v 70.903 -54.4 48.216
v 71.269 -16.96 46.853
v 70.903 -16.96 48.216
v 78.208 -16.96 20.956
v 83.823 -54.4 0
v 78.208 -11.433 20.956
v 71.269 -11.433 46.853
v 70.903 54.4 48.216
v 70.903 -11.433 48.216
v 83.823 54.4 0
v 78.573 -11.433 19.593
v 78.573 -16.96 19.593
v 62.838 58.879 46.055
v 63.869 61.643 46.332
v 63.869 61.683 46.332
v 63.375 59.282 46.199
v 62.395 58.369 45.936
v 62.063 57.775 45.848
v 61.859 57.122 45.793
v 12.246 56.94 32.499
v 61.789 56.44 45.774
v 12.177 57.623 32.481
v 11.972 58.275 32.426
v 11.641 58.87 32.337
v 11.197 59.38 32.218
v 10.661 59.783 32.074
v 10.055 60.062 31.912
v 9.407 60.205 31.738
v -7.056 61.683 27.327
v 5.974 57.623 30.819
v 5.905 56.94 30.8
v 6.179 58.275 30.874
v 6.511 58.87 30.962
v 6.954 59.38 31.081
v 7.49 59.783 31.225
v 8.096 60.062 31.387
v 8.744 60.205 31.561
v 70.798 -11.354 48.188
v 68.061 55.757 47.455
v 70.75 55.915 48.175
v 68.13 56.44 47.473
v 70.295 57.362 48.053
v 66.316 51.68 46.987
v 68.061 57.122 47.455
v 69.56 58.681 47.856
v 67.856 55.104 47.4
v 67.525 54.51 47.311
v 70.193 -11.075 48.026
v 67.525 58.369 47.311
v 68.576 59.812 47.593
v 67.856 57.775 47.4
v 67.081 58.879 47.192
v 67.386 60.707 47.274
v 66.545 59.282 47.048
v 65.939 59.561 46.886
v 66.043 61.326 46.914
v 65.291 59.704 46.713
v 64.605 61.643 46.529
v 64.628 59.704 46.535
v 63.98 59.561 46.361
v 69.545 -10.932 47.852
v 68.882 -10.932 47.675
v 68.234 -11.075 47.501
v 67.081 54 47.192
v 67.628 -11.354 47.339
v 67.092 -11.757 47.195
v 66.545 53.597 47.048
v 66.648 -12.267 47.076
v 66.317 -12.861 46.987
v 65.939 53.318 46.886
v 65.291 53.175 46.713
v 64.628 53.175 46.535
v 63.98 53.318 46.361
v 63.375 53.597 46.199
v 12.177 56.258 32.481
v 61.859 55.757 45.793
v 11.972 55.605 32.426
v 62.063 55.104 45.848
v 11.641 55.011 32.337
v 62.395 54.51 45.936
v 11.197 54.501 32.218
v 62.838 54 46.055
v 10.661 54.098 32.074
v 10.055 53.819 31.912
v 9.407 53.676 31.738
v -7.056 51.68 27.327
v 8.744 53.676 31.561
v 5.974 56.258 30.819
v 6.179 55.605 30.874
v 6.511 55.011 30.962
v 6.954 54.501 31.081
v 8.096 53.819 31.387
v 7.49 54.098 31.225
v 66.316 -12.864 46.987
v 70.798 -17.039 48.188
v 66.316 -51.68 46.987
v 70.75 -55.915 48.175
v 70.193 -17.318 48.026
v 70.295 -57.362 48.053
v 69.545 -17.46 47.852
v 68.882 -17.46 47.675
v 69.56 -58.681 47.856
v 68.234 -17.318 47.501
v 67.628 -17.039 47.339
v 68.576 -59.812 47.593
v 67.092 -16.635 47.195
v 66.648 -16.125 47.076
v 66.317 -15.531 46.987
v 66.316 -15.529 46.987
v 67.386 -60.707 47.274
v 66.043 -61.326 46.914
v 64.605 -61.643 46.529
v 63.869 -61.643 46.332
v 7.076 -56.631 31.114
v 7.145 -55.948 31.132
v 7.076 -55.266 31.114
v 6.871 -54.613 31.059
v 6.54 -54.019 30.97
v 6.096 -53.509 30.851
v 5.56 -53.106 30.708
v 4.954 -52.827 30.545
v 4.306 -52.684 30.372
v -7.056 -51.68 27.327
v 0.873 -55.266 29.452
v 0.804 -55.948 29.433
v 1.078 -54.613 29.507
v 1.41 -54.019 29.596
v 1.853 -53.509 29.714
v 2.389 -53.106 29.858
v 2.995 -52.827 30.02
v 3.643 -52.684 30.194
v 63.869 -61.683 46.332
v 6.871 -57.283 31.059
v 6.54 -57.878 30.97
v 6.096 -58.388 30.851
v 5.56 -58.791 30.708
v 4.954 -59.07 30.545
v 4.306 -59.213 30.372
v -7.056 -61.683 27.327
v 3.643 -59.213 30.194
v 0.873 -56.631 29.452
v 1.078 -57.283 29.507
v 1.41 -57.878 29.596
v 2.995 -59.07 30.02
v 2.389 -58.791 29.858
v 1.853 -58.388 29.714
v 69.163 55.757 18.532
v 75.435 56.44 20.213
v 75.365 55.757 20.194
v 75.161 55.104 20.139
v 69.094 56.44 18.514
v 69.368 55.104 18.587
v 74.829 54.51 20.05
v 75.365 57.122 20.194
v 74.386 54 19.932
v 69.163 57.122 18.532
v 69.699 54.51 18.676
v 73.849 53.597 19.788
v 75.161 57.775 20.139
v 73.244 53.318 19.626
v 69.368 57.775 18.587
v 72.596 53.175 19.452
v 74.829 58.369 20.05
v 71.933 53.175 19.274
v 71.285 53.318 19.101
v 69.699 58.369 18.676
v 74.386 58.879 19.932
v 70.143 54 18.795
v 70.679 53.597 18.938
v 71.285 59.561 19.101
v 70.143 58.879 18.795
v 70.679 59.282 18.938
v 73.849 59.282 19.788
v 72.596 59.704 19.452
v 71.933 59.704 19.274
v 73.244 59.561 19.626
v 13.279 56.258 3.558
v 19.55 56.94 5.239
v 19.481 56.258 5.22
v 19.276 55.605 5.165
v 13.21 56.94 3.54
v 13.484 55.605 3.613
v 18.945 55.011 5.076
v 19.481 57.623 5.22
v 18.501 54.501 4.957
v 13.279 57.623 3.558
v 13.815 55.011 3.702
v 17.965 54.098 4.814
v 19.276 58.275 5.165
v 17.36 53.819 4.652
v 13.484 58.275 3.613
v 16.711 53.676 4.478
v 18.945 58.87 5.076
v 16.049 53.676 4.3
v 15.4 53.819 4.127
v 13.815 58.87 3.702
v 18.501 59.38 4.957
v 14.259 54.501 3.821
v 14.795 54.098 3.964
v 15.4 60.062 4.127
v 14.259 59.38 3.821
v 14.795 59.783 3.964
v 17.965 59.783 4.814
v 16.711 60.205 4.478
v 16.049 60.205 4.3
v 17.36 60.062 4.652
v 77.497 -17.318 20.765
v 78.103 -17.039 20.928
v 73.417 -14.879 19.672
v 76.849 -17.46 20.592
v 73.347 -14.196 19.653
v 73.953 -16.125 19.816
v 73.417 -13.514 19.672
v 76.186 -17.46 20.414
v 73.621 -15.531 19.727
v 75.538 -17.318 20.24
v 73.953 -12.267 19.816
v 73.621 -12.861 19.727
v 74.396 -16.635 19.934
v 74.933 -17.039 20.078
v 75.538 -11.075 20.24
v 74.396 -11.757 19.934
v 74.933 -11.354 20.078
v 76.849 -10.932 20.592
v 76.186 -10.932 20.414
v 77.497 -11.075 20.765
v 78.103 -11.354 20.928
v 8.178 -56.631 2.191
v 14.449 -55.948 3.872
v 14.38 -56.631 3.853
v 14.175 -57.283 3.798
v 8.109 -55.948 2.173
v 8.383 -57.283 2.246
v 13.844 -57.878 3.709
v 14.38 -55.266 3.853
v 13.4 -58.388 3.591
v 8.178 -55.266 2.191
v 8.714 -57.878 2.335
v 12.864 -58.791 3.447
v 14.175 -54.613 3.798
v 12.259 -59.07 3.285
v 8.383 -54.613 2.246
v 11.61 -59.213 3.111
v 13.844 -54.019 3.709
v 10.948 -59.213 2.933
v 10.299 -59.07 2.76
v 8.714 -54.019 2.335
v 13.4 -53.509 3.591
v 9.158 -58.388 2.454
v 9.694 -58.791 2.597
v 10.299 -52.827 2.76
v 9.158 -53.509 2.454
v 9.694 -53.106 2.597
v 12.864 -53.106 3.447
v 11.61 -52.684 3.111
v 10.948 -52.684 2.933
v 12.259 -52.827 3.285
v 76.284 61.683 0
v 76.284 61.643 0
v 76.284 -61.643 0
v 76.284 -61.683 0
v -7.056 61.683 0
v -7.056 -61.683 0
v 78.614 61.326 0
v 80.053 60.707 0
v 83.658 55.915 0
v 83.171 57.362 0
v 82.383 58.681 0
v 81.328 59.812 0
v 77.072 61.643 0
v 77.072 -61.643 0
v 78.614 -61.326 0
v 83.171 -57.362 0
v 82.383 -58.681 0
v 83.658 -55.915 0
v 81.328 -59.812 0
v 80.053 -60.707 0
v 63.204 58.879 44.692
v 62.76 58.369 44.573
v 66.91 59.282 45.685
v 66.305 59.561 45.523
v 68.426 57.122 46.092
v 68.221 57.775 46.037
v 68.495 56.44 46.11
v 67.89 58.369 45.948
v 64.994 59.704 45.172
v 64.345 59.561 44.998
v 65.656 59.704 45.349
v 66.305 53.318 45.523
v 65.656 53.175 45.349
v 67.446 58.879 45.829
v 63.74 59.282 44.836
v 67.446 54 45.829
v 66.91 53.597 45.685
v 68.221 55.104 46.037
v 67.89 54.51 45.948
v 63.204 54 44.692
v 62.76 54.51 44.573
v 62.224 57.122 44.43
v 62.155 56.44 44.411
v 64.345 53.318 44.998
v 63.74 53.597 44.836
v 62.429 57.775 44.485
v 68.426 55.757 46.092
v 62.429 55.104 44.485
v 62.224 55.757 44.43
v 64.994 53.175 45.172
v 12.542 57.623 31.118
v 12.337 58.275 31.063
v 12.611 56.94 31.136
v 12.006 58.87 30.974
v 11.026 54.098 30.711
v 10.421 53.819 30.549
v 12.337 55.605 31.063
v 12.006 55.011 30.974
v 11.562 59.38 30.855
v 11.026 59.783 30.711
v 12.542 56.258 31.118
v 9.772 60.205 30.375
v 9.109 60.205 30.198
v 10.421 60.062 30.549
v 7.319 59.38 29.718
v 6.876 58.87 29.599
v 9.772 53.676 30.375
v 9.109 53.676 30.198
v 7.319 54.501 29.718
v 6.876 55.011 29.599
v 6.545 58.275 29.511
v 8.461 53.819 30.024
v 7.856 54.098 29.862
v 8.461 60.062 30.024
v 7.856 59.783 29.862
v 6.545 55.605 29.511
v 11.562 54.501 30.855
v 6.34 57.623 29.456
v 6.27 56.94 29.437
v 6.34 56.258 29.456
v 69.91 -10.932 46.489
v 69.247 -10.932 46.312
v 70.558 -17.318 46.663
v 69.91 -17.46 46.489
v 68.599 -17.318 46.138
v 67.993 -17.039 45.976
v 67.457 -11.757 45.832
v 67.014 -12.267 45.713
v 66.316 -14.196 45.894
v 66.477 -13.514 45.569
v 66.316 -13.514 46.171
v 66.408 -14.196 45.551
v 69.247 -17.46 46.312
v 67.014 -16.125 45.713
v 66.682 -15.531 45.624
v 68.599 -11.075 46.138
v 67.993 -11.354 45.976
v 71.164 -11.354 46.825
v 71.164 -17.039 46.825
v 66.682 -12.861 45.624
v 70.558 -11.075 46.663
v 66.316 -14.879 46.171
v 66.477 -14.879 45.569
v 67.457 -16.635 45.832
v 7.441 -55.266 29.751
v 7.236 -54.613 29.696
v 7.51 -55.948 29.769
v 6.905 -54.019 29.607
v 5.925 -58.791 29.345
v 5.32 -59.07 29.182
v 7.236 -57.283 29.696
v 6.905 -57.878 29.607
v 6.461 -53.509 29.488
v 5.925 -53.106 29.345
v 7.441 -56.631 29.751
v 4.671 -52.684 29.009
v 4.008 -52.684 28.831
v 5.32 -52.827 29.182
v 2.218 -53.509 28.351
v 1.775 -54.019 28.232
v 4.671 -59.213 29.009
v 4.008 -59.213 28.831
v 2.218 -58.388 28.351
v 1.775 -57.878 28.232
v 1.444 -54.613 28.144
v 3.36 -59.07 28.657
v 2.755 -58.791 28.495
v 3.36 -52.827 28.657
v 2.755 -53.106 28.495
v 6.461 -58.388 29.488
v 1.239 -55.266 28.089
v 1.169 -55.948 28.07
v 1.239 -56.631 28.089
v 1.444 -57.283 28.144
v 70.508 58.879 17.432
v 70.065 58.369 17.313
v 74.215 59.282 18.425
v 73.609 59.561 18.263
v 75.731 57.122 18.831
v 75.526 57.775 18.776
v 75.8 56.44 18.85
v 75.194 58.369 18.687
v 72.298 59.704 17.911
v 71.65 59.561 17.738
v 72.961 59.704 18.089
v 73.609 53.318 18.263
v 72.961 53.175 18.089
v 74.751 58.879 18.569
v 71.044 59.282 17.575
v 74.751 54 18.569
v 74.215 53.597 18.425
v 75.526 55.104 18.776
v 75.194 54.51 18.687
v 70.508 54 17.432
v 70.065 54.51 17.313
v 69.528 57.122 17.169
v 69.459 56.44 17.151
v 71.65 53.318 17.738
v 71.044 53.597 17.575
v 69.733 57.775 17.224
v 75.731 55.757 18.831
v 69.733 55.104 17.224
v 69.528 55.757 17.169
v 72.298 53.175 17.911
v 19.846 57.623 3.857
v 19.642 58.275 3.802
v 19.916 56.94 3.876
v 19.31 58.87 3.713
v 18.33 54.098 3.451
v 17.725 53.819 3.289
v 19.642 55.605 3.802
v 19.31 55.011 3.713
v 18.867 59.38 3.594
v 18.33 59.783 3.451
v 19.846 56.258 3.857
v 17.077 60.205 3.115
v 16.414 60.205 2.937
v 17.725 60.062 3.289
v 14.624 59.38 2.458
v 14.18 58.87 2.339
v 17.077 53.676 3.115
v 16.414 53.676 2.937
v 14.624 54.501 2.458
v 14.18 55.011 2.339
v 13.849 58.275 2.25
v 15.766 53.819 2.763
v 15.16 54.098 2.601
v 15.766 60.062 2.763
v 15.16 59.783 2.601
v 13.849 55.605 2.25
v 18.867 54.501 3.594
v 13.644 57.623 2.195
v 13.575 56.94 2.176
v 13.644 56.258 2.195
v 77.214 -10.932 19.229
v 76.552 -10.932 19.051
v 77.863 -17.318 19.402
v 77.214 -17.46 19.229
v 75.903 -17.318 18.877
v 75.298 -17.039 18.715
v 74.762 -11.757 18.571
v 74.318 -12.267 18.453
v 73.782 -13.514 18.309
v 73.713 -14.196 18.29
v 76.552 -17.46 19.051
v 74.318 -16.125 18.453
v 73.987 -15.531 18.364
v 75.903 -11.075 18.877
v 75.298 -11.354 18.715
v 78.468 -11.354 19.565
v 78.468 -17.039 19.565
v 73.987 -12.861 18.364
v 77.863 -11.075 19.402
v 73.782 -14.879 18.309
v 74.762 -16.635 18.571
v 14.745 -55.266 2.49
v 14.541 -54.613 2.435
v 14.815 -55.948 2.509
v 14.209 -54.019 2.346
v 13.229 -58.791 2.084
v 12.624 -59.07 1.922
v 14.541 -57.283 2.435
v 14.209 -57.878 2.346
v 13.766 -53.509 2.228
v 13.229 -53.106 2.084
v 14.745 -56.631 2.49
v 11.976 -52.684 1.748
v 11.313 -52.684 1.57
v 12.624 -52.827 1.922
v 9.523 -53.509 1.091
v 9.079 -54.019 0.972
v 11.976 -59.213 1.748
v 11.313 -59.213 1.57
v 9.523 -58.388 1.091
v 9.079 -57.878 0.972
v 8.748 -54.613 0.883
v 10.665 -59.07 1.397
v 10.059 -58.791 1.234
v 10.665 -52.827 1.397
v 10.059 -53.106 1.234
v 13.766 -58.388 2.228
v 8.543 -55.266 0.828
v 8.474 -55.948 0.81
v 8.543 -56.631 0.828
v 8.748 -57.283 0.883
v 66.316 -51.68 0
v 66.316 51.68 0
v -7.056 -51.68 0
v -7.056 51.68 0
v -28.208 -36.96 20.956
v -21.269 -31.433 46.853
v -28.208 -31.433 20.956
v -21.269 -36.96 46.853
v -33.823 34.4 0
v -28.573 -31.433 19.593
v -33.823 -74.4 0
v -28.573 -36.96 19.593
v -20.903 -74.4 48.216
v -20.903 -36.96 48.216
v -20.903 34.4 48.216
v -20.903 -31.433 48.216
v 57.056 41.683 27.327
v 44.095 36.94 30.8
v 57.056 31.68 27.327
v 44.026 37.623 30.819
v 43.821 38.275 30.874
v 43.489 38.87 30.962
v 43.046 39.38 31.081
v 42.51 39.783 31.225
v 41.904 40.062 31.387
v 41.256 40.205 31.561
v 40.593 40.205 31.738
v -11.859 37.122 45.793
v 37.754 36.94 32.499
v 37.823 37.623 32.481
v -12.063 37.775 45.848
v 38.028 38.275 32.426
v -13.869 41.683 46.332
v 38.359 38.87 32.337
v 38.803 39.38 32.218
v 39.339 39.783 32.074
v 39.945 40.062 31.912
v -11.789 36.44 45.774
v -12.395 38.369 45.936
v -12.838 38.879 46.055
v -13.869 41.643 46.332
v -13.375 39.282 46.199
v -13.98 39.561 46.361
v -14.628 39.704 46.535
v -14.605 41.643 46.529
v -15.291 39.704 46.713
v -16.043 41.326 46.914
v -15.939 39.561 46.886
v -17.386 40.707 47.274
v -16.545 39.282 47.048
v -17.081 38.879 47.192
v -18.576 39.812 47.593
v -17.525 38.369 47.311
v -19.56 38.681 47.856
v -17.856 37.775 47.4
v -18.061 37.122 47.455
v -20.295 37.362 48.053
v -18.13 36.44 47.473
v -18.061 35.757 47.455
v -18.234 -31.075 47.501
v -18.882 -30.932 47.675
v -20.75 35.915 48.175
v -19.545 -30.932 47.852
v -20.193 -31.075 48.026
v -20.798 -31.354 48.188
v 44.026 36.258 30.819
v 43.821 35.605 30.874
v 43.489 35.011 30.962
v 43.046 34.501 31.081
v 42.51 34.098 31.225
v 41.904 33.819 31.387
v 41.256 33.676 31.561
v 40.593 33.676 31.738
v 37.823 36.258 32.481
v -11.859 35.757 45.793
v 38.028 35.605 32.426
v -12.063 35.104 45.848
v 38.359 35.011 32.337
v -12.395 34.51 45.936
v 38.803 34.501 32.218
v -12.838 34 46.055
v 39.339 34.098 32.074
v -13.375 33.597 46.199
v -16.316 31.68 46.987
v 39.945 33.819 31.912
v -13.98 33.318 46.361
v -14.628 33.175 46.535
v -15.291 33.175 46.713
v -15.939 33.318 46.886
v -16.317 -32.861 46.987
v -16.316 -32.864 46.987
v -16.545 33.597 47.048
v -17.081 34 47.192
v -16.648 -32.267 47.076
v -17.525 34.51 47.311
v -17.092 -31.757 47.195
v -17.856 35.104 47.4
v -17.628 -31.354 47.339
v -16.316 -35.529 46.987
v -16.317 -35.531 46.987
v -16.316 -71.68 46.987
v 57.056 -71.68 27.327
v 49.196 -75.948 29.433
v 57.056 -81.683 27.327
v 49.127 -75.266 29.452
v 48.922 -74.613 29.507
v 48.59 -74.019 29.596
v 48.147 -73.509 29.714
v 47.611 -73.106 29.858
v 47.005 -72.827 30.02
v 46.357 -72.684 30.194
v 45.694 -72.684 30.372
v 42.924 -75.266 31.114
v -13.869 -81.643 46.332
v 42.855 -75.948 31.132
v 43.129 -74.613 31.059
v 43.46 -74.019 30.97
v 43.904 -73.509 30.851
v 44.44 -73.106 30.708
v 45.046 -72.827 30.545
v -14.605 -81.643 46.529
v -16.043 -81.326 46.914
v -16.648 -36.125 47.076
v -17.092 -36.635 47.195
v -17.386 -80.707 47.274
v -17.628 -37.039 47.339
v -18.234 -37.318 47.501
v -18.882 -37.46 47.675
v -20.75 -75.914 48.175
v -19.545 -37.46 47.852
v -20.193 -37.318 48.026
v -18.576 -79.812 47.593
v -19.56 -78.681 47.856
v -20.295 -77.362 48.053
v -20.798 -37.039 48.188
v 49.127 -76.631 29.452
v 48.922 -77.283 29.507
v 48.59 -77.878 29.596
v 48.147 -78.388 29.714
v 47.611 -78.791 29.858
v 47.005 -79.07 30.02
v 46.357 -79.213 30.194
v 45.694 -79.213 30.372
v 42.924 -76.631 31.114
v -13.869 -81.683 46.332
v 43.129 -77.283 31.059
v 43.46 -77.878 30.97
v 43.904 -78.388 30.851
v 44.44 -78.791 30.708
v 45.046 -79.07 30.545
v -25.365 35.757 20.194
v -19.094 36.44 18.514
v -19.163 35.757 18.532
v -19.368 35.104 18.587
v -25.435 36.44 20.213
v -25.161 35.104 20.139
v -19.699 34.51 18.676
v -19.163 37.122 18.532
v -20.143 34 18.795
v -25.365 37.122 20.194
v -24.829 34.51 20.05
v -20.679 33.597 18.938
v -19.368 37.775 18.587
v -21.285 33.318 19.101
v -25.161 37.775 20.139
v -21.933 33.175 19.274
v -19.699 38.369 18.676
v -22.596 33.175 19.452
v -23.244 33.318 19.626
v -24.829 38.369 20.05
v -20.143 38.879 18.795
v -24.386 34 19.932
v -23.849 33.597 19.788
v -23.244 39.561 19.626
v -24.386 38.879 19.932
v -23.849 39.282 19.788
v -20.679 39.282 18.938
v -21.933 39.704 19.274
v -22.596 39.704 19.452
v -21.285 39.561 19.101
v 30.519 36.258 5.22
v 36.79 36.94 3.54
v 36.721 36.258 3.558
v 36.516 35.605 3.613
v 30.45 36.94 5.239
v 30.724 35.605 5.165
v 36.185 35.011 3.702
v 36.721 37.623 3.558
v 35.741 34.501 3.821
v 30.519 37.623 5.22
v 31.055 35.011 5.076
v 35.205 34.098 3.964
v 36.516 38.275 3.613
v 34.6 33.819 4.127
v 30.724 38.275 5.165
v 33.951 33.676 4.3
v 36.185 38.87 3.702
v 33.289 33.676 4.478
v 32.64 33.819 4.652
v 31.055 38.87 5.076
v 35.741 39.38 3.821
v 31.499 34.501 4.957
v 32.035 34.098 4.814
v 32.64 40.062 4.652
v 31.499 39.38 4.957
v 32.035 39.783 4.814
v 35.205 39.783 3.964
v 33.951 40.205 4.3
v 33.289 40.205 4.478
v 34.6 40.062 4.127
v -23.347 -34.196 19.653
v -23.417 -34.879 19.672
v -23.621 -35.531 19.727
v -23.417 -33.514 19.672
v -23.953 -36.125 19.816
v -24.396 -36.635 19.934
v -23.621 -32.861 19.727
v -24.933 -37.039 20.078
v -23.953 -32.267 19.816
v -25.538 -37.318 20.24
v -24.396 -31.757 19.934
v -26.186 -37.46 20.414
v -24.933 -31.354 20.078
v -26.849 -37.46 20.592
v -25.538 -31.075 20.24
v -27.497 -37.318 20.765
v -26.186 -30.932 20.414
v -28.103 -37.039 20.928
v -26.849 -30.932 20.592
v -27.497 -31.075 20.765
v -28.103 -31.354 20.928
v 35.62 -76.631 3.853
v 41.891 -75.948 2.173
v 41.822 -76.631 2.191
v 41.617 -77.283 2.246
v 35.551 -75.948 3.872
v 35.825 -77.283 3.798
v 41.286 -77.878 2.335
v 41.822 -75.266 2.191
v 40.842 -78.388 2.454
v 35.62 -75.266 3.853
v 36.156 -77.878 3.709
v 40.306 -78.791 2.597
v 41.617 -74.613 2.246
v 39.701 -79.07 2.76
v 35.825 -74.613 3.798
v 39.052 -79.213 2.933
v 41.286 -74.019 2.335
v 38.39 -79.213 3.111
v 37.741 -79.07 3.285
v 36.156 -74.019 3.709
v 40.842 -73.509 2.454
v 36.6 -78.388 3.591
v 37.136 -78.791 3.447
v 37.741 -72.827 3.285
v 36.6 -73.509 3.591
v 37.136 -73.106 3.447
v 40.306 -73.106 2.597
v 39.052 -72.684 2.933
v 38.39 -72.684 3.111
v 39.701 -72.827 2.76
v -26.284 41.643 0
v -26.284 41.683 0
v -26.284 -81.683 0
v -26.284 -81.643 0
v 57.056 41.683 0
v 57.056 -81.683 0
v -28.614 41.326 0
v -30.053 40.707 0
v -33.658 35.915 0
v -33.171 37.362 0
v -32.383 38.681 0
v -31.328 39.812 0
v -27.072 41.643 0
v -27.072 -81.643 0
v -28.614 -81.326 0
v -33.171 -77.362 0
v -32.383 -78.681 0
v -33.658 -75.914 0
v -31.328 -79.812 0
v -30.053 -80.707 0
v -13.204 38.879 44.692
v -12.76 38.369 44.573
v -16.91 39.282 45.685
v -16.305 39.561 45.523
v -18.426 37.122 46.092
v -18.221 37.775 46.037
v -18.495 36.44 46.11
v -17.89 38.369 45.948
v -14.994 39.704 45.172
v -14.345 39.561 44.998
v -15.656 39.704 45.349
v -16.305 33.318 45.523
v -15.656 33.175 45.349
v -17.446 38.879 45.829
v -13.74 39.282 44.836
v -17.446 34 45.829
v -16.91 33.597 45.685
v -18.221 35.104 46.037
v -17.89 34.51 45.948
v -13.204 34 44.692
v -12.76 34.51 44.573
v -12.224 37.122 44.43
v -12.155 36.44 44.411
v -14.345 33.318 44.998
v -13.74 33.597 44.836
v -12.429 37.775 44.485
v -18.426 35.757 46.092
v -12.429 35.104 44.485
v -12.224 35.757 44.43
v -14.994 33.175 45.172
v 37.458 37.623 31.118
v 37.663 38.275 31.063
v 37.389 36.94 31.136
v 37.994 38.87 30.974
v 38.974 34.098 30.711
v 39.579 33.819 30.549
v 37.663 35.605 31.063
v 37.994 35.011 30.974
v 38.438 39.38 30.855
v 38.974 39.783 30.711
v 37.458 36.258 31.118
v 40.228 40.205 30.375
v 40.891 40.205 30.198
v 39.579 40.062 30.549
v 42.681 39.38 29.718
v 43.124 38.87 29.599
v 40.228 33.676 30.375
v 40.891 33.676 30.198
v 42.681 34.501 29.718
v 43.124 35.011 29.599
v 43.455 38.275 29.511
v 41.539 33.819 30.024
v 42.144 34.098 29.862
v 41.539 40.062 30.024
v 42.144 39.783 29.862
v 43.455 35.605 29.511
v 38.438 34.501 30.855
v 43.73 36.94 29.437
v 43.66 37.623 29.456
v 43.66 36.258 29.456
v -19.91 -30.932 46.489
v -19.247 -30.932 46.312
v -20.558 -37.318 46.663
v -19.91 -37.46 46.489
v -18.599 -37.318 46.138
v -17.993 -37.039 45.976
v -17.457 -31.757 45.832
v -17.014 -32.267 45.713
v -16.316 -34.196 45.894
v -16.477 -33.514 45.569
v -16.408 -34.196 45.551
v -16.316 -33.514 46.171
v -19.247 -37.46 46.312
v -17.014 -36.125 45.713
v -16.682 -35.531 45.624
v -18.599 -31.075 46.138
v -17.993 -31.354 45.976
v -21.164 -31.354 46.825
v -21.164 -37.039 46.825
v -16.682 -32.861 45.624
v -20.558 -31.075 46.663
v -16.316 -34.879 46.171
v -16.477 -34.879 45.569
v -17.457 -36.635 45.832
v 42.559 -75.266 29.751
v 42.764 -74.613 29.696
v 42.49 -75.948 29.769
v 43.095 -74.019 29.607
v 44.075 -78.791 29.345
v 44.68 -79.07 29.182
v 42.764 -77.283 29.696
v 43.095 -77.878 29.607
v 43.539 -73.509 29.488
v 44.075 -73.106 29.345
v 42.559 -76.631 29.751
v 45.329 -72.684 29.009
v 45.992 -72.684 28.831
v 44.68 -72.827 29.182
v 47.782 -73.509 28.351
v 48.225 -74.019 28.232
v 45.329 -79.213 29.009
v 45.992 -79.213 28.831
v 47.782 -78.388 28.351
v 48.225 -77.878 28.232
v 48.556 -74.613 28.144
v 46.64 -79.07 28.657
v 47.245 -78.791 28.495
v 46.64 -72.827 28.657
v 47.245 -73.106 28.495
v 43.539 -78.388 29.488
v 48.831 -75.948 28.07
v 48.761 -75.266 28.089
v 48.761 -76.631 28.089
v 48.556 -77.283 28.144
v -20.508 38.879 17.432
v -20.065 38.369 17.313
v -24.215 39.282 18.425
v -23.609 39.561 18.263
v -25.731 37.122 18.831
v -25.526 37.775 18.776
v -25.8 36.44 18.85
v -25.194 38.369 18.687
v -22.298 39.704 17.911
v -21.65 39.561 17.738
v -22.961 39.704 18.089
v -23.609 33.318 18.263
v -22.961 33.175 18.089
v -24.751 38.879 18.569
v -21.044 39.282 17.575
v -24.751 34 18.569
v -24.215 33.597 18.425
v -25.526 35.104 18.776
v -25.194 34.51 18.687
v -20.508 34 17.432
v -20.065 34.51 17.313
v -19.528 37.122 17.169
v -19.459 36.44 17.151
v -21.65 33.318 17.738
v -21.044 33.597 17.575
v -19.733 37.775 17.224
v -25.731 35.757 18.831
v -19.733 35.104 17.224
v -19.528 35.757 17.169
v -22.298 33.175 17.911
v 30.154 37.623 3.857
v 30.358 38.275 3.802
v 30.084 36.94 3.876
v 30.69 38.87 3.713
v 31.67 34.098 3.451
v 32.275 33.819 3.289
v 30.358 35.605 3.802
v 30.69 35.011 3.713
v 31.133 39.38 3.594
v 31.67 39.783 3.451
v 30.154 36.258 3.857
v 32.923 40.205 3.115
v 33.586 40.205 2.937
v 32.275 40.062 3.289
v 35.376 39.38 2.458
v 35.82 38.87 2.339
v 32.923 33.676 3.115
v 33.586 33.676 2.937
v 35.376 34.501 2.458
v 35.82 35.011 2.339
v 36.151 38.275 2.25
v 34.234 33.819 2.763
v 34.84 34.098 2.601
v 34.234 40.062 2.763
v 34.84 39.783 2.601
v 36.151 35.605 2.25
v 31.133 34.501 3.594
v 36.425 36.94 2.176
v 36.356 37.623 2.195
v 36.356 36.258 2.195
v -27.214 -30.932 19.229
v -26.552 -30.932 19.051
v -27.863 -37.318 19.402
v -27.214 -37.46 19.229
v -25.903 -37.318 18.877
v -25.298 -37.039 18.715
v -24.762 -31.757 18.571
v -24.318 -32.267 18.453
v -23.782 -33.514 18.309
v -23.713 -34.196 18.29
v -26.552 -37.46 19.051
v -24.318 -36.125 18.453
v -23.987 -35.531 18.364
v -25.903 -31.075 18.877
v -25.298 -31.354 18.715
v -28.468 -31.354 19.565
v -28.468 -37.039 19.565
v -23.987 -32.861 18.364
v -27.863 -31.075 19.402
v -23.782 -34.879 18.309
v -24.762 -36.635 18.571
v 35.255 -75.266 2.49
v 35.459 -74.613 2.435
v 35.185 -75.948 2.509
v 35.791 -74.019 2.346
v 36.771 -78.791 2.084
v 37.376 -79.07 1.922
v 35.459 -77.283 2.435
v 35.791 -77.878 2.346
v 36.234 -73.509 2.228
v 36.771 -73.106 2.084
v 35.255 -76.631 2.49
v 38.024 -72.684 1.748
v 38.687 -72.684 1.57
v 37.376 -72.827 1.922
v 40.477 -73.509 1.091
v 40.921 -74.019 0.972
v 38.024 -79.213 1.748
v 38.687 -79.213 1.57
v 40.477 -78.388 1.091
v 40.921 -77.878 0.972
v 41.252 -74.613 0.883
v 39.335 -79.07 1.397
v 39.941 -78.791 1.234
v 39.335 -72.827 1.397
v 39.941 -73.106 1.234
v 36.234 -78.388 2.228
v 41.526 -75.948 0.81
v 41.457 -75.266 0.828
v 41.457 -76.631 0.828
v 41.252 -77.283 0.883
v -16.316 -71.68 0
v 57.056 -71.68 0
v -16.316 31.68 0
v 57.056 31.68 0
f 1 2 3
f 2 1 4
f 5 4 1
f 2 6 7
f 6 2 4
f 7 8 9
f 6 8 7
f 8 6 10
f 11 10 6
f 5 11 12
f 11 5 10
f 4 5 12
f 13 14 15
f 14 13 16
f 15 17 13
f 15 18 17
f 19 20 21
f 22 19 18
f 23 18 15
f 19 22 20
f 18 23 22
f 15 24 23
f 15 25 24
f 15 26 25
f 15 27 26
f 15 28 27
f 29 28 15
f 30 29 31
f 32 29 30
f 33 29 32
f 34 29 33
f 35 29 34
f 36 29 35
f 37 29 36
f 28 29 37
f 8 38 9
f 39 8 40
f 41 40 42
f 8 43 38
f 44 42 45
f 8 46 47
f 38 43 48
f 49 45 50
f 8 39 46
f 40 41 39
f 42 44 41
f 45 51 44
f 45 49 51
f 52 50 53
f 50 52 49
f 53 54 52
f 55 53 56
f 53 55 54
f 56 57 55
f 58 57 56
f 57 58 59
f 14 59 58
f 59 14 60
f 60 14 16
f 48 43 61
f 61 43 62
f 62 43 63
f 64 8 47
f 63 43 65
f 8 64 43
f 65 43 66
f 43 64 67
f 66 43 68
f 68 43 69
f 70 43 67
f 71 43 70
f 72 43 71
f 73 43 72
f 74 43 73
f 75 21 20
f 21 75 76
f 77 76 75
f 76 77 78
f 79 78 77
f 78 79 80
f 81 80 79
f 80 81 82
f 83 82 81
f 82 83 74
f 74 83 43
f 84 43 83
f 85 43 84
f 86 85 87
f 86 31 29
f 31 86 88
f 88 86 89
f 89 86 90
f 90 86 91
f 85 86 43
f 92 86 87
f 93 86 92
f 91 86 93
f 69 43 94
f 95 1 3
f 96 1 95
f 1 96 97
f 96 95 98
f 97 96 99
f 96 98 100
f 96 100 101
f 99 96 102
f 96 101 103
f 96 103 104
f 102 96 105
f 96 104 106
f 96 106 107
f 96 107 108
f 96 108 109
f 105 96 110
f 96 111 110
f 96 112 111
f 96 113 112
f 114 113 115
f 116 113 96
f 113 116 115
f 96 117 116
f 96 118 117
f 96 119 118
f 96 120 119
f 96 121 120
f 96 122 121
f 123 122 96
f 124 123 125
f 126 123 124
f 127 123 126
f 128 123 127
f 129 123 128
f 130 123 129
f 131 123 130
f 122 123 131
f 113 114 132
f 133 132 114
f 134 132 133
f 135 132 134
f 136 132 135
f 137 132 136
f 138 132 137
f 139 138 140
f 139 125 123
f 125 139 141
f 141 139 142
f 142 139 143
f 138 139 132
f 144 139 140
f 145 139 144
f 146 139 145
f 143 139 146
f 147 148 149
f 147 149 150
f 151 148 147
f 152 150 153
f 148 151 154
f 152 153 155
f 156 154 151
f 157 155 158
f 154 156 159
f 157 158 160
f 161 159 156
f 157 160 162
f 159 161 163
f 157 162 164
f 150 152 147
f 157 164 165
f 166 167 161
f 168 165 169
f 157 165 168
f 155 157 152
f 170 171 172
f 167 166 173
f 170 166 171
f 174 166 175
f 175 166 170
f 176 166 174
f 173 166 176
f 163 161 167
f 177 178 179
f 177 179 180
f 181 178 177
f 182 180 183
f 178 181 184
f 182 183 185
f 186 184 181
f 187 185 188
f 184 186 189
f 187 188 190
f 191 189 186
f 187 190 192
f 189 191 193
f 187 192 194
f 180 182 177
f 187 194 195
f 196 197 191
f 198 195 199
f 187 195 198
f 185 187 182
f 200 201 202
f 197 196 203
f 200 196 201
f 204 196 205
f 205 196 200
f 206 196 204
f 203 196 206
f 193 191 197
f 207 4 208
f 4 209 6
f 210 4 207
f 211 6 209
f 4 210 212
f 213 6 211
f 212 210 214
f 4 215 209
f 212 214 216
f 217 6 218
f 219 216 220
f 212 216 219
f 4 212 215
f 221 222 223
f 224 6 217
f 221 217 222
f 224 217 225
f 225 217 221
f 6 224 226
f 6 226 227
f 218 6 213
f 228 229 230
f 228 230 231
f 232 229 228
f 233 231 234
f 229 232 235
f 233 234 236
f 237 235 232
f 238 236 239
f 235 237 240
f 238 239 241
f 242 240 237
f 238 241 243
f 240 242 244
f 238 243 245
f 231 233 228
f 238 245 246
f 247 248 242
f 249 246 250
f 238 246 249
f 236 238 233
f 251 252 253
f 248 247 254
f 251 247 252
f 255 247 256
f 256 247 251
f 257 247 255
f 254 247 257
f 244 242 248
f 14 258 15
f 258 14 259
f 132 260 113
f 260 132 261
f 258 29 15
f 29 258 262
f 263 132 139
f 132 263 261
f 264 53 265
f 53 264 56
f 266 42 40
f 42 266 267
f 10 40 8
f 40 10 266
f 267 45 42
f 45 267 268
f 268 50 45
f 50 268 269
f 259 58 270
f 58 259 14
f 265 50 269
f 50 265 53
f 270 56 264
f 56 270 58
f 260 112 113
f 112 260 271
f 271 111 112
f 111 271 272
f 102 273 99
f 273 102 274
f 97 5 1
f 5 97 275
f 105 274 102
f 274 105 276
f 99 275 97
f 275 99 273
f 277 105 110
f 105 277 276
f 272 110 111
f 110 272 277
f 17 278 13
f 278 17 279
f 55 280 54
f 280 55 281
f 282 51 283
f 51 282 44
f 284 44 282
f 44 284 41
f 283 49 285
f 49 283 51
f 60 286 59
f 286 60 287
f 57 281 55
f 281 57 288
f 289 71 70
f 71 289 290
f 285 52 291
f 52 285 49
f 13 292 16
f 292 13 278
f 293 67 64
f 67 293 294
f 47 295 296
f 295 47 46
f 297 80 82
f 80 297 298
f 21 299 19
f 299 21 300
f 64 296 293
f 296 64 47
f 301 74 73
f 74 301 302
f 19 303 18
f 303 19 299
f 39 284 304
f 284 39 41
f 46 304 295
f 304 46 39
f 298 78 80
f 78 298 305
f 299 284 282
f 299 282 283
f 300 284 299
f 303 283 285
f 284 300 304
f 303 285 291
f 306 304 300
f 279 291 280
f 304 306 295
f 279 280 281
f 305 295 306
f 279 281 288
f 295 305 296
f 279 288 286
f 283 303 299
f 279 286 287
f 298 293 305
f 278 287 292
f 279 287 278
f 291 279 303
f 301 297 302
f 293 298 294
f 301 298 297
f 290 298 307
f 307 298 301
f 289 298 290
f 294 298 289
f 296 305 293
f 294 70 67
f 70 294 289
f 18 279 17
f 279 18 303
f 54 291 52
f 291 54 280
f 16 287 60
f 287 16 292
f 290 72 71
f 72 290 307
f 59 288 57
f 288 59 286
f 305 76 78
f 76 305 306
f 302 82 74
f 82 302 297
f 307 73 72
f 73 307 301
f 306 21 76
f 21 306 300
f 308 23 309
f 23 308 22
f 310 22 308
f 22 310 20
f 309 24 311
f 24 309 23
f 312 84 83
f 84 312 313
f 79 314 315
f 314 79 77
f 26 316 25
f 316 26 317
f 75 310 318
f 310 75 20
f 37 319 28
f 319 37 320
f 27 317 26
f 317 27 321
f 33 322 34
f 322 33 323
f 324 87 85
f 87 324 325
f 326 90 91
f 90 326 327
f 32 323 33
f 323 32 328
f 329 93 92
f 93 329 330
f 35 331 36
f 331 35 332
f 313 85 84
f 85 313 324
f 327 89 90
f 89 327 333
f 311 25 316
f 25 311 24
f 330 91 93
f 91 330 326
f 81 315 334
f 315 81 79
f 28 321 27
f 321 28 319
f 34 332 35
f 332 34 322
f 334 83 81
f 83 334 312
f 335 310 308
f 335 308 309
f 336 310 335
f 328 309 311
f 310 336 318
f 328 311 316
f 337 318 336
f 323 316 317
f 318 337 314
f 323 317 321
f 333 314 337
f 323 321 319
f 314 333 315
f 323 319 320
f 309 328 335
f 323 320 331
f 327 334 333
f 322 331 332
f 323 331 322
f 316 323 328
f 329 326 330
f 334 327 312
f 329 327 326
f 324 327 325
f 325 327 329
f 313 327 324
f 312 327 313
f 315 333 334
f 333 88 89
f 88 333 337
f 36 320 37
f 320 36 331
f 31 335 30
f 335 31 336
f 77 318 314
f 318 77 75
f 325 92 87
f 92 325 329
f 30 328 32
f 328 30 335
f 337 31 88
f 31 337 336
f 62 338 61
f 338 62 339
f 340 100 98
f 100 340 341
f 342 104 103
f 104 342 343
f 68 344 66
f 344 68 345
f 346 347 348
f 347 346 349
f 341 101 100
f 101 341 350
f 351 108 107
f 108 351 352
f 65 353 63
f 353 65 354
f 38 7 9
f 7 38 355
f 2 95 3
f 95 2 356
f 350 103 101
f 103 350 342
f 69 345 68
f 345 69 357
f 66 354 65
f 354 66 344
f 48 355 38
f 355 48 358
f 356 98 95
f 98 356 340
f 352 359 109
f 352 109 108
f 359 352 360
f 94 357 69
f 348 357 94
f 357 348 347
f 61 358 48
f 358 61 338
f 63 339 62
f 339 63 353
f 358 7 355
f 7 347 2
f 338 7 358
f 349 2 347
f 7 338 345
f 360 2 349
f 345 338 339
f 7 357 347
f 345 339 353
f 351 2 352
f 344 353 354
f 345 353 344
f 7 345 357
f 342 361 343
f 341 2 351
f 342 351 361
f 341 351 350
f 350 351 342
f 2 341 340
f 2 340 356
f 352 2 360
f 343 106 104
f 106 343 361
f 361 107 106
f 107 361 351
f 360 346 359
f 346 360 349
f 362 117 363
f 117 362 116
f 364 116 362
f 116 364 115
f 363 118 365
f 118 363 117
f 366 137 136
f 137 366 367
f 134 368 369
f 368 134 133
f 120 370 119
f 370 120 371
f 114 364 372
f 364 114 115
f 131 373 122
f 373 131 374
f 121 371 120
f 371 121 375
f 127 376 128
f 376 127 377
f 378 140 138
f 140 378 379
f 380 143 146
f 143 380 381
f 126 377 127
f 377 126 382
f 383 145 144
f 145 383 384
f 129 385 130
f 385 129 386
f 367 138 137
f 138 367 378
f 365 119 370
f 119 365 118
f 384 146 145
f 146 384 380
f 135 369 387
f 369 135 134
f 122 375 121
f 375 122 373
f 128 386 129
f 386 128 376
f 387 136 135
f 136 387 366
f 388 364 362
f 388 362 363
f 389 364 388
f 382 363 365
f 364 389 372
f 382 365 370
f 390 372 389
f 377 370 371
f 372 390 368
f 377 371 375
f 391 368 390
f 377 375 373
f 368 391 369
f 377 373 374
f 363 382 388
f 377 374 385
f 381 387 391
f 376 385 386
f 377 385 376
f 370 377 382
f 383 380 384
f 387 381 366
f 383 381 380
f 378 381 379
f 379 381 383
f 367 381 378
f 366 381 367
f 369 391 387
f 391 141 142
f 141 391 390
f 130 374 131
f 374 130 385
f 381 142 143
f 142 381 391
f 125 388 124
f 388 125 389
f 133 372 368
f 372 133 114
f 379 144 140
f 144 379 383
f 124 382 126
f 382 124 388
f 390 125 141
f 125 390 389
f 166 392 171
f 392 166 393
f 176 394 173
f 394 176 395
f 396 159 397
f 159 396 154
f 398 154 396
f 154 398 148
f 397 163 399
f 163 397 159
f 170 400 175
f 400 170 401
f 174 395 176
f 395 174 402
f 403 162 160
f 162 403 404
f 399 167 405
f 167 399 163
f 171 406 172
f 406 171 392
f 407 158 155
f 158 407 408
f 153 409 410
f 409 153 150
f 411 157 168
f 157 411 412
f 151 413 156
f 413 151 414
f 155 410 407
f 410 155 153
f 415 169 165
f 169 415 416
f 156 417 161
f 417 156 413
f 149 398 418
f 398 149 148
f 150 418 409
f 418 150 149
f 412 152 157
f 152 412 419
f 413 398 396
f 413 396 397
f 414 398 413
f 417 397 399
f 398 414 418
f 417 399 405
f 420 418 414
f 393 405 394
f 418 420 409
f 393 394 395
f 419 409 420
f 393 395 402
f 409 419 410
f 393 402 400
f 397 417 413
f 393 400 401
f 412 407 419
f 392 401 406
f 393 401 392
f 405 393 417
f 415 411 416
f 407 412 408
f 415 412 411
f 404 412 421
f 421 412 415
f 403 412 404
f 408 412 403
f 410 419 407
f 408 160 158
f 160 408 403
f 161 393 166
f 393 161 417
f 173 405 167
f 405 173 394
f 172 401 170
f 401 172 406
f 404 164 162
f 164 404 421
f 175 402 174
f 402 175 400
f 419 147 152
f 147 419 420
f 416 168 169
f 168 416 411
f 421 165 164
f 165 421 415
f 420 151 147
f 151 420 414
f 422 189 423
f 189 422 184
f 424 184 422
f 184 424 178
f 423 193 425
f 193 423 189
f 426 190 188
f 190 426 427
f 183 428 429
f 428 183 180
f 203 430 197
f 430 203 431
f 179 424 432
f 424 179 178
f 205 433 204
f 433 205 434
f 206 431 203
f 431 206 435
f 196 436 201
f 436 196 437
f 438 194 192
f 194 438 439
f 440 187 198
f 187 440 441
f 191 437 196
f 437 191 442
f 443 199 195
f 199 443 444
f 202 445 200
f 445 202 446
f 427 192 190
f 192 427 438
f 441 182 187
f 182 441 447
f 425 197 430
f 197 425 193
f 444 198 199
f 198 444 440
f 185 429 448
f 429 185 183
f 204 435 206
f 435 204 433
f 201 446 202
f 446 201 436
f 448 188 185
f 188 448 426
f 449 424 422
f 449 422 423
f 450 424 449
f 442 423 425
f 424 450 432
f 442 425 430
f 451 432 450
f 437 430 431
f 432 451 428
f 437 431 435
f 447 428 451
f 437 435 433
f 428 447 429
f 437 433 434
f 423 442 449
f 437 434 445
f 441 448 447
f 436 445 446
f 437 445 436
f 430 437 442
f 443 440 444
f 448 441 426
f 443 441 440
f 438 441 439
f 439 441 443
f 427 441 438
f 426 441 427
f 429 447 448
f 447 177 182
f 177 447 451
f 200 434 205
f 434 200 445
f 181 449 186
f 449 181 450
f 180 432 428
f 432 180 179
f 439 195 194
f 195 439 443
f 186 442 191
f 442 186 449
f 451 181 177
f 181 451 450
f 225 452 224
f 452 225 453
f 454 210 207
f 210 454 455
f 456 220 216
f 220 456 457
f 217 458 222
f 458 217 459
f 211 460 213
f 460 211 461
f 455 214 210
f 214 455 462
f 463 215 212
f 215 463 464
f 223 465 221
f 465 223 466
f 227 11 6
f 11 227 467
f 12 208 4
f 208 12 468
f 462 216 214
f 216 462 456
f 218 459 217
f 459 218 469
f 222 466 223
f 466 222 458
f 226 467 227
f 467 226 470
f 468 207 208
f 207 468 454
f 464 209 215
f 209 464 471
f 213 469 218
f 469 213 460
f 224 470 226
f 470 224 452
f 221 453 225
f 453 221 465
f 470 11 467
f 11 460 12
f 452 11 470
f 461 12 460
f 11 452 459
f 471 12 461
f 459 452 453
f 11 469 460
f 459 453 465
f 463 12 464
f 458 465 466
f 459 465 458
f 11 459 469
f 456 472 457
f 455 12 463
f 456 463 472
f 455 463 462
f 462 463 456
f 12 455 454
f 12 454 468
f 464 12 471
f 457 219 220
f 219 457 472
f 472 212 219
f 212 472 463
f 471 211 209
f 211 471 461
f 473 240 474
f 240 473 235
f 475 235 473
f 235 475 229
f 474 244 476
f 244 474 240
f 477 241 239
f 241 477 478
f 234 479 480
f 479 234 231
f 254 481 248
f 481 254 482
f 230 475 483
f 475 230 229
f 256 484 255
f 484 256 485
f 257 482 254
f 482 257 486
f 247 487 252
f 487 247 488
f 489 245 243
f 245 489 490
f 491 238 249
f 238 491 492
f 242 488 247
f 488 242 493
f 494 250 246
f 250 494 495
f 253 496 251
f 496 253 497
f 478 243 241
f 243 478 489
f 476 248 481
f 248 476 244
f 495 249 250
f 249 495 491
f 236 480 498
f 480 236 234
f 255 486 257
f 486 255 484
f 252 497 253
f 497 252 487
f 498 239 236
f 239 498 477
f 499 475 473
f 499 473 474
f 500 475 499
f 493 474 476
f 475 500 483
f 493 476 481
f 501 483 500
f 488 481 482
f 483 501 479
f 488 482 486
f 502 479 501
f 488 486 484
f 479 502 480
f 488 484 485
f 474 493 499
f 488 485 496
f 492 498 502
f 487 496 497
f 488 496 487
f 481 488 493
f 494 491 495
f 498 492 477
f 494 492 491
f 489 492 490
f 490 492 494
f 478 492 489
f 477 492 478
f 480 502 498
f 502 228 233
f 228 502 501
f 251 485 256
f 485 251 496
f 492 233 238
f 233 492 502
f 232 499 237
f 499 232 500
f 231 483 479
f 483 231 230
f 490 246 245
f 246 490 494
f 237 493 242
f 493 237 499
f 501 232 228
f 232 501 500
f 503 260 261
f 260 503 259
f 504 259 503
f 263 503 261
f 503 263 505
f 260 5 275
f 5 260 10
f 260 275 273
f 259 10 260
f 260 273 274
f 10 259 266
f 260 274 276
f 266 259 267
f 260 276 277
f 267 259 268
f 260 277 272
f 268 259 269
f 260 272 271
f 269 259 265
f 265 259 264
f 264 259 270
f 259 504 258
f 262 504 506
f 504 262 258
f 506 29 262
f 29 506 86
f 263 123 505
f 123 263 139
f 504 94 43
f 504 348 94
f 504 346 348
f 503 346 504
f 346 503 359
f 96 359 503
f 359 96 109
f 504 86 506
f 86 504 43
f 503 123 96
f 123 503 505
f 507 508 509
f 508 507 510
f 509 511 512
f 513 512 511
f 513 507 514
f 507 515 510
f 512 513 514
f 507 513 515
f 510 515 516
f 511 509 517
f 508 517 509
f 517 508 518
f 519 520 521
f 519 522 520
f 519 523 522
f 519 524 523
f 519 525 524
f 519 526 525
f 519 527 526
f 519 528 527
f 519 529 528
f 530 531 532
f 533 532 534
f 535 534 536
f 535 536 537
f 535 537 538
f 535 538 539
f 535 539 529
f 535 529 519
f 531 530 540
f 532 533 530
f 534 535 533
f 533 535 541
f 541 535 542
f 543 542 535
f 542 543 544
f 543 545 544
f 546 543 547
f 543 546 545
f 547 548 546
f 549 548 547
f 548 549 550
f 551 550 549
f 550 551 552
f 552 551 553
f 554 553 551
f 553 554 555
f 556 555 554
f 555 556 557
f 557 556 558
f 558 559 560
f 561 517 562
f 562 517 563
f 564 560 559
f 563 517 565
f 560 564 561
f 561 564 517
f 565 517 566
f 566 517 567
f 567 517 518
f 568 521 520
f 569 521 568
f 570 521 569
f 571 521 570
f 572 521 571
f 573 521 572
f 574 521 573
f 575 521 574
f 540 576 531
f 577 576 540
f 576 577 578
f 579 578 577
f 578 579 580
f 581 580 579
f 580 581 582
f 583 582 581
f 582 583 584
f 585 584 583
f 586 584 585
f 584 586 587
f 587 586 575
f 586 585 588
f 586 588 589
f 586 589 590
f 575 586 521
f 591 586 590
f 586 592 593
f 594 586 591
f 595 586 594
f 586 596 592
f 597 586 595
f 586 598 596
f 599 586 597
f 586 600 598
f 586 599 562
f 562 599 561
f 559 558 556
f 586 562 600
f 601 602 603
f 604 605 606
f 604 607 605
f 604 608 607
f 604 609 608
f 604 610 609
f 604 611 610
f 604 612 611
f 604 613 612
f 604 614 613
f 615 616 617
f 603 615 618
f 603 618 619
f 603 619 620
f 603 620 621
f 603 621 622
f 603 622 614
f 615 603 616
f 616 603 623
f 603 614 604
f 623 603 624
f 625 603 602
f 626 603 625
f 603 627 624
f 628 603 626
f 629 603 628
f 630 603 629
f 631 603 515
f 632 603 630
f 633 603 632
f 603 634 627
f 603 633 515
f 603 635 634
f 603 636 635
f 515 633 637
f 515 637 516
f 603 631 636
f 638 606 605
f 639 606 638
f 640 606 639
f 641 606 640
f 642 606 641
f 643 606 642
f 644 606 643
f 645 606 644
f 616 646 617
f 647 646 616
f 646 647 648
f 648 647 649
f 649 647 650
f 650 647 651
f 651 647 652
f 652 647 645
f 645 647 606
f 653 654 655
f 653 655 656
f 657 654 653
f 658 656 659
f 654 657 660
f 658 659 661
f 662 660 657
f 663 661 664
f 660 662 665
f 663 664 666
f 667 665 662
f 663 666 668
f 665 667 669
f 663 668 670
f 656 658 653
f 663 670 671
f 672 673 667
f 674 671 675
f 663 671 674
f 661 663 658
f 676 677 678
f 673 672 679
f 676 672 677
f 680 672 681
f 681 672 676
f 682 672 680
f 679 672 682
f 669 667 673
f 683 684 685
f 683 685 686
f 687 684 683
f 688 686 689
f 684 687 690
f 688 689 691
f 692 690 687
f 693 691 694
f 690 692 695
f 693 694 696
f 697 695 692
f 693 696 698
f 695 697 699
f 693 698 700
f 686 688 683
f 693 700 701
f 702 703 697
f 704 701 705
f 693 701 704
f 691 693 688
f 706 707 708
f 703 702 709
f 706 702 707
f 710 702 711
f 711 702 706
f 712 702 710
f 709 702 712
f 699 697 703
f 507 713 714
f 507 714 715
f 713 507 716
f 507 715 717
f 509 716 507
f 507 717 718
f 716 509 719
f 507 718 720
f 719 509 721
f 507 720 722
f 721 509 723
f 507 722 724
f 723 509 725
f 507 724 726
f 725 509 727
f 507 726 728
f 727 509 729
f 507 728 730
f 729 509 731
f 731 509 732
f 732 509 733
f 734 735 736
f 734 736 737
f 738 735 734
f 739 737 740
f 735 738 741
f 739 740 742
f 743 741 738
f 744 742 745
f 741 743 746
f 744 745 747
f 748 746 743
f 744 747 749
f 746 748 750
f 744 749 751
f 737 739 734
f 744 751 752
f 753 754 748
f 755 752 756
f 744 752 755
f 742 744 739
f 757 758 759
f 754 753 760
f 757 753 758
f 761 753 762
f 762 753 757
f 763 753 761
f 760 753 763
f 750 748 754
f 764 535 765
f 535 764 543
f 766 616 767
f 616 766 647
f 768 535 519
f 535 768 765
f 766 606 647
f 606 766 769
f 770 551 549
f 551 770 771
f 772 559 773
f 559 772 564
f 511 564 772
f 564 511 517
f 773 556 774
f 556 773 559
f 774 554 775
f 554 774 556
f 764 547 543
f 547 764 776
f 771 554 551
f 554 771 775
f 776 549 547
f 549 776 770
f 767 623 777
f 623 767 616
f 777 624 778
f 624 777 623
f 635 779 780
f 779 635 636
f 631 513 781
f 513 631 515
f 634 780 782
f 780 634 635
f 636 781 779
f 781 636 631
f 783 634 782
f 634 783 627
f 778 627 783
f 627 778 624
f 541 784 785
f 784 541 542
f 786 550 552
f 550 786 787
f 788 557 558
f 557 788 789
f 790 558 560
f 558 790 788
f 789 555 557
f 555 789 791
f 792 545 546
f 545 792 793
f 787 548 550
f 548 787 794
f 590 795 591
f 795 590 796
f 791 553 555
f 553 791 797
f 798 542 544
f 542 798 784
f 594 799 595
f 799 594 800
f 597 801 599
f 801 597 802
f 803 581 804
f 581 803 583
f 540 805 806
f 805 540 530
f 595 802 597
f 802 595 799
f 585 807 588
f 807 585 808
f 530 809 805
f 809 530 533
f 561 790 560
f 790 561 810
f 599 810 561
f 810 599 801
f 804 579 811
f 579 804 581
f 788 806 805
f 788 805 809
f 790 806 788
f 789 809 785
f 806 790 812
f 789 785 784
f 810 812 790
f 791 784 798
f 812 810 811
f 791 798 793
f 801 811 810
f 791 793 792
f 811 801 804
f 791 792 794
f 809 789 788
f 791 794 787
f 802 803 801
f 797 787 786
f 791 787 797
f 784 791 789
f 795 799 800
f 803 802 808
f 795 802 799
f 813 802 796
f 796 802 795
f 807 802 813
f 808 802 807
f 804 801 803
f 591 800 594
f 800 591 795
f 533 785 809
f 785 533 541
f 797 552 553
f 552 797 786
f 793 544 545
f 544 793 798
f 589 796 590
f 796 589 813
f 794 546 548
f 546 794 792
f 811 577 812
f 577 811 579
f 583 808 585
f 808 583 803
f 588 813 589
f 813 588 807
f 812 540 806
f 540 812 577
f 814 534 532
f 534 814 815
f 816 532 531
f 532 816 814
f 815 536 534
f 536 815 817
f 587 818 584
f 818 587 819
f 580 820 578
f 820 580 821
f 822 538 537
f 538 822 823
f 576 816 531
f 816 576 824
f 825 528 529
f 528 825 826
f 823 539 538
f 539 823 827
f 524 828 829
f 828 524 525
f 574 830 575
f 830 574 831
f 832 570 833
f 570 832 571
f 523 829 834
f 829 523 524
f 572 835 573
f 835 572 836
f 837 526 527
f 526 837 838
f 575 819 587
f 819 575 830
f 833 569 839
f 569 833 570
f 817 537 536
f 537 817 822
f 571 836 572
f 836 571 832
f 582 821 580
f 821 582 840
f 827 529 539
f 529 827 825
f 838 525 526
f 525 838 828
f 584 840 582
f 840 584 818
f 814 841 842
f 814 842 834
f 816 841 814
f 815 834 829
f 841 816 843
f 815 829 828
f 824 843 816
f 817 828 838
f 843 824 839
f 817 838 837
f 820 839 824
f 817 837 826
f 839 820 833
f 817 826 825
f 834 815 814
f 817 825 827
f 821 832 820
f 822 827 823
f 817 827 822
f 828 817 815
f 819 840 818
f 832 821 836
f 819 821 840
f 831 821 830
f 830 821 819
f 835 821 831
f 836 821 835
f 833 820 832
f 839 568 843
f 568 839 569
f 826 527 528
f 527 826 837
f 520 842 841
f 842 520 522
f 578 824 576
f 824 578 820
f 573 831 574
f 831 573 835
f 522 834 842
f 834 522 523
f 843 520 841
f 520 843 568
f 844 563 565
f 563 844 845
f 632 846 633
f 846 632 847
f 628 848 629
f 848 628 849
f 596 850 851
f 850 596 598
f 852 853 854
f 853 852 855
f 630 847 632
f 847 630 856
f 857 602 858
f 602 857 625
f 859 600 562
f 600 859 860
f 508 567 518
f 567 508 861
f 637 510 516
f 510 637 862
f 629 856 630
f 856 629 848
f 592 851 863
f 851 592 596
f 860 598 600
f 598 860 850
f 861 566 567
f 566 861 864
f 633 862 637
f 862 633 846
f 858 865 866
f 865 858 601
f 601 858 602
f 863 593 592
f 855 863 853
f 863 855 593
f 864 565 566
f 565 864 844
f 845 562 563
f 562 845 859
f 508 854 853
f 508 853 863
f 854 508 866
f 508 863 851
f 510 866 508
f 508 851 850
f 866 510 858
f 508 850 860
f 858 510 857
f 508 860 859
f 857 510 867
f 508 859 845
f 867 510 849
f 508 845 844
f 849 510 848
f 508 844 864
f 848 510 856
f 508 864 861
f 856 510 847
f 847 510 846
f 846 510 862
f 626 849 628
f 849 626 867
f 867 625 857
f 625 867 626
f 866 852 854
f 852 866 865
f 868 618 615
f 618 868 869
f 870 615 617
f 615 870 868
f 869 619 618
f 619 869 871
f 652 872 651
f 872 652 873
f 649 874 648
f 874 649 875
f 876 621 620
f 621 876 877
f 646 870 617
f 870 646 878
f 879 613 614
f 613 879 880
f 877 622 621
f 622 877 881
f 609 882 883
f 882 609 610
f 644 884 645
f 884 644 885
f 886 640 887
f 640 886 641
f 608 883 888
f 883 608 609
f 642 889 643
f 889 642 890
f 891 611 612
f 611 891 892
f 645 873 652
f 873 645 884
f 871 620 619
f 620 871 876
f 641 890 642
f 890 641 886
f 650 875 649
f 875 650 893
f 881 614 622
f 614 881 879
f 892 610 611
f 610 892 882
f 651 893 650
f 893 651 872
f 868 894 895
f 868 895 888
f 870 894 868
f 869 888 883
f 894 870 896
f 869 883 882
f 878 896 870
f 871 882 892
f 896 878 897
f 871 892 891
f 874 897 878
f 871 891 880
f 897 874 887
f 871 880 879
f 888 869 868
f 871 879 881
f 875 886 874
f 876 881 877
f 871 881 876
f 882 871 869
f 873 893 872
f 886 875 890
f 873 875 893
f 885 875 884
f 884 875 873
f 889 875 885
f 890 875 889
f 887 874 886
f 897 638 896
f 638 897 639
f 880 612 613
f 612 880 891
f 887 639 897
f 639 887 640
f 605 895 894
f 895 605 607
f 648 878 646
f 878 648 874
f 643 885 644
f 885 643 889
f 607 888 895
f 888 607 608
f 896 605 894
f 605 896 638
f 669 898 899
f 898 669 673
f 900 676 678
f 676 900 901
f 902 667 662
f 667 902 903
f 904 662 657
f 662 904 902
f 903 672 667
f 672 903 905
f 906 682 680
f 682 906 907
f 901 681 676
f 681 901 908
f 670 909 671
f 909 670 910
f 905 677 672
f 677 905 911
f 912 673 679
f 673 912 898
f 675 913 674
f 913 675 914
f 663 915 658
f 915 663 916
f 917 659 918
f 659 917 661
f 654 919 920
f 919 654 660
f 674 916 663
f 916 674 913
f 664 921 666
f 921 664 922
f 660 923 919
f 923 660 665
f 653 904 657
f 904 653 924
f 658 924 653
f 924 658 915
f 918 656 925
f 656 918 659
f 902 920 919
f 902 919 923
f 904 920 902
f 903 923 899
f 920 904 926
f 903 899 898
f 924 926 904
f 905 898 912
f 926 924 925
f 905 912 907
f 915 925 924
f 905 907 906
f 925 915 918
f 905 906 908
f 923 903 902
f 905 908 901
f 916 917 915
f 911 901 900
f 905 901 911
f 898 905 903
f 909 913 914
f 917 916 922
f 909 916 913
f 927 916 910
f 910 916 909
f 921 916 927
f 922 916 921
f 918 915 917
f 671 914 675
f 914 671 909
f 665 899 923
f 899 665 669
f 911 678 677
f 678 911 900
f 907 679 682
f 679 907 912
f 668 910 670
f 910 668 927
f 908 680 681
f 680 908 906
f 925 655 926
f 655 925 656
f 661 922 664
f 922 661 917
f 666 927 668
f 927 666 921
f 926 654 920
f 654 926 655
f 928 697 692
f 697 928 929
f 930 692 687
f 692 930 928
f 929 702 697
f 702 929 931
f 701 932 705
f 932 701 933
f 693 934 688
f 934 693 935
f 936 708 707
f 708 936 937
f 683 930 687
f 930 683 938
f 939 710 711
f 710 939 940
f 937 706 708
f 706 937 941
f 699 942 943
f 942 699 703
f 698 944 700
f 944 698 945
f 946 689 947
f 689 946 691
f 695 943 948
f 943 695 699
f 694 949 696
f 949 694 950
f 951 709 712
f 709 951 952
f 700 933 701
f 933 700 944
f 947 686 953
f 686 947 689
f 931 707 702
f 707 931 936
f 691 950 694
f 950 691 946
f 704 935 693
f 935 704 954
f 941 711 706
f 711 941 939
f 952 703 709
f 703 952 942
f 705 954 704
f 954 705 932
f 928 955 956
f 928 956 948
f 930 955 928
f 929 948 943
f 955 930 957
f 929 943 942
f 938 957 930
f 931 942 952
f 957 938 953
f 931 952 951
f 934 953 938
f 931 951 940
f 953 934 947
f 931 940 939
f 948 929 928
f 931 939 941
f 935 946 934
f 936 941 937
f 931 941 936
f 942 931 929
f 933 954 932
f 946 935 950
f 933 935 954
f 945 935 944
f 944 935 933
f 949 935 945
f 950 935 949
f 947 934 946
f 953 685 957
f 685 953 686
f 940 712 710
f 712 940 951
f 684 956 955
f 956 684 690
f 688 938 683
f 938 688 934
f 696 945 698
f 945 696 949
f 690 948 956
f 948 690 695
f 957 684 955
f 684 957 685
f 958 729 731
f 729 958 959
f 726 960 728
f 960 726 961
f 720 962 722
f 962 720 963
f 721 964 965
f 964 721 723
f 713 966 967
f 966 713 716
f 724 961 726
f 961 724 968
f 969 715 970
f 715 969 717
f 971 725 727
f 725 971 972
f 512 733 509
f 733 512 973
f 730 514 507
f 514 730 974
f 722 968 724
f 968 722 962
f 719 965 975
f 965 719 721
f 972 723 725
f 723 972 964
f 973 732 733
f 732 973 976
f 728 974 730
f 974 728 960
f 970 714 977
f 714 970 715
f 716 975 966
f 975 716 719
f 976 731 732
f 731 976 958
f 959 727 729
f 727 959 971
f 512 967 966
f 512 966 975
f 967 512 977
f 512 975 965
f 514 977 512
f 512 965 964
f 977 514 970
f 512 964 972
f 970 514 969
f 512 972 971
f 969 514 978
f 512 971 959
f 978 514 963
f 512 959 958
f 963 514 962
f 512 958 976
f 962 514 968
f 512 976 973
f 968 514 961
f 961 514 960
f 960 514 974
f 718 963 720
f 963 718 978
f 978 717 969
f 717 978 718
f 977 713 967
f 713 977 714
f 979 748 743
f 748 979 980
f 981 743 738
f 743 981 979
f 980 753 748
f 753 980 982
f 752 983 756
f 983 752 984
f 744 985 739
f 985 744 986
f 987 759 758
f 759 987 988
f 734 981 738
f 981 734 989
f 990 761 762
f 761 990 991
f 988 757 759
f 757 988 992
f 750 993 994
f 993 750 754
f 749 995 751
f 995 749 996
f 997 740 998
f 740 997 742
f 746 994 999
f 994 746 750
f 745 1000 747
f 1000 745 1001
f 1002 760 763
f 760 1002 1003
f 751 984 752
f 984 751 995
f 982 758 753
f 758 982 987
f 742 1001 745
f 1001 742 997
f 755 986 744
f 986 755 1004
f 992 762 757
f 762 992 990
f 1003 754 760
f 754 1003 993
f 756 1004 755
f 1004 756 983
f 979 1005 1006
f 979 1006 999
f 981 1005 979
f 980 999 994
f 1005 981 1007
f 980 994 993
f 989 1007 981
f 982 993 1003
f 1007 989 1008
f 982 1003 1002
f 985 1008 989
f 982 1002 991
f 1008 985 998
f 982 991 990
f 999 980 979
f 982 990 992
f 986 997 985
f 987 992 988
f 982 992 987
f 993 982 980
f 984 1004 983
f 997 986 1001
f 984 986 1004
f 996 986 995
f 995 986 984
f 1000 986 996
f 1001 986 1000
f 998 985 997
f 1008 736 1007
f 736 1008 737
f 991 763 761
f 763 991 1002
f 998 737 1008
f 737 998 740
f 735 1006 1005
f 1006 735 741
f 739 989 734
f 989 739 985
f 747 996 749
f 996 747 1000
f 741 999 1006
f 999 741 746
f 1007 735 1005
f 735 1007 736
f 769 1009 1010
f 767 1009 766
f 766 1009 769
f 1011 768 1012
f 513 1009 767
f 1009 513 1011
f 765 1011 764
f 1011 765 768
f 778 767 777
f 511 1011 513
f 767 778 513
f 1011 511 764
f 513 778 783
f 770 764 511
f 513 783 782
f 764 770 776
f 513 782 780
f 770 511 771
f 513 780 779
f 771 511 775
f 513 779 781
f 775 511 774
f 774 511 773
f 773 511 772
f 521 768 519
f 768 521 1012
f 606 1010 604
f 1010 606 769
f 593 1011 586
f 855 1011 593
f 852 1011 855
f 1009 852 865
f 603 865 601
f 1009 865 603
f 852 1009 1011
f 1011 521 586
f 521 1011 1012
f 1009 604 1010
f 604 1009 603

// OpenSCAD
rect_depth = 385.515;
rect_width = 522.174;
rect_height = 100;

curve_radius = 25.803;

total_width = rect_width + 2*curve_radius;
total_depth = rect_depth + 2*curve_radius;

slope = PI/12 * 180/PI;
echo(slope);
screw_radius = 11.63/2;
nut_radius = 11.63;
module nut_hole() {
    cylinder(r=nut_radius, h=5*rect_height, center=true);
}

module main_base() {
    difference() {
        translate([0, 0, rect_height/2]) {
            union() {
                cube([total_width, rect_depth, rect_height], center=true);
                cube([rect_width, total_depth, rect_height], center=true);
                translate([rect_width/2, rect_depth/2, 0]) cylinder(r=curve_radius, h=rect_height, center=true);
                translate([rect_width/-2, rect_depth/2, 0]) cylinder(r=curve_radius, h=rect_height, center=true);
                translate([rect_width/-2, rect_depth/-2, 0]) cylinder(r=curve_radius, h=rect_height, center=true);
                translate([rect_width/2, rect_depth/-2, 0]) cylinder(r=curve_radius, h=rect_height, center=true);
            }
        }
        translate([rect_width/2 + 4, rect_depth/2 + 4 + 3.225, 345]) nut_hole();
        translate([rect_width/2 + 4 - 205, rect_depth/2 + 4 + 5, 345]) nut_hole();
        translate([rect_width/2 + 4 + 15.603, rect_depth/2 + 4 - 247.059, 345]) nut_hole();
        translate([rect_width/2 + 4 - 223.712, rect_depth/2 + 4 - 395, 345]) nut_hole();
    }
}
//main_base();

shift_down_height = (rect_height - (total_width/2 * tan(slope))) * cos(slope);

module flush_top() {
    translate([0, 0, -shift_down_height*0]) rotate([0, -slope, 0]) {
        union() {
            main_base();
            translate([0, 0, -100]) main_base();
        }
    }
}
//flush_top();

module tent() {
    scale(25.4/90) difference() {
        flush_top();
        translate([0, 0, -250]) cube([700, 700, 500], center=true);
        translate([-375, 0, -0]) cube([700, 700, 500], center=true);
        translate([0, 0, 100]) cube([0.9*rect_width, 0.95*rect_depth, 300], center=true);
    }
}

union() {
    tent();
    translate([50, -20, 0]) mirror([1, 0, 0]) tent();
}
